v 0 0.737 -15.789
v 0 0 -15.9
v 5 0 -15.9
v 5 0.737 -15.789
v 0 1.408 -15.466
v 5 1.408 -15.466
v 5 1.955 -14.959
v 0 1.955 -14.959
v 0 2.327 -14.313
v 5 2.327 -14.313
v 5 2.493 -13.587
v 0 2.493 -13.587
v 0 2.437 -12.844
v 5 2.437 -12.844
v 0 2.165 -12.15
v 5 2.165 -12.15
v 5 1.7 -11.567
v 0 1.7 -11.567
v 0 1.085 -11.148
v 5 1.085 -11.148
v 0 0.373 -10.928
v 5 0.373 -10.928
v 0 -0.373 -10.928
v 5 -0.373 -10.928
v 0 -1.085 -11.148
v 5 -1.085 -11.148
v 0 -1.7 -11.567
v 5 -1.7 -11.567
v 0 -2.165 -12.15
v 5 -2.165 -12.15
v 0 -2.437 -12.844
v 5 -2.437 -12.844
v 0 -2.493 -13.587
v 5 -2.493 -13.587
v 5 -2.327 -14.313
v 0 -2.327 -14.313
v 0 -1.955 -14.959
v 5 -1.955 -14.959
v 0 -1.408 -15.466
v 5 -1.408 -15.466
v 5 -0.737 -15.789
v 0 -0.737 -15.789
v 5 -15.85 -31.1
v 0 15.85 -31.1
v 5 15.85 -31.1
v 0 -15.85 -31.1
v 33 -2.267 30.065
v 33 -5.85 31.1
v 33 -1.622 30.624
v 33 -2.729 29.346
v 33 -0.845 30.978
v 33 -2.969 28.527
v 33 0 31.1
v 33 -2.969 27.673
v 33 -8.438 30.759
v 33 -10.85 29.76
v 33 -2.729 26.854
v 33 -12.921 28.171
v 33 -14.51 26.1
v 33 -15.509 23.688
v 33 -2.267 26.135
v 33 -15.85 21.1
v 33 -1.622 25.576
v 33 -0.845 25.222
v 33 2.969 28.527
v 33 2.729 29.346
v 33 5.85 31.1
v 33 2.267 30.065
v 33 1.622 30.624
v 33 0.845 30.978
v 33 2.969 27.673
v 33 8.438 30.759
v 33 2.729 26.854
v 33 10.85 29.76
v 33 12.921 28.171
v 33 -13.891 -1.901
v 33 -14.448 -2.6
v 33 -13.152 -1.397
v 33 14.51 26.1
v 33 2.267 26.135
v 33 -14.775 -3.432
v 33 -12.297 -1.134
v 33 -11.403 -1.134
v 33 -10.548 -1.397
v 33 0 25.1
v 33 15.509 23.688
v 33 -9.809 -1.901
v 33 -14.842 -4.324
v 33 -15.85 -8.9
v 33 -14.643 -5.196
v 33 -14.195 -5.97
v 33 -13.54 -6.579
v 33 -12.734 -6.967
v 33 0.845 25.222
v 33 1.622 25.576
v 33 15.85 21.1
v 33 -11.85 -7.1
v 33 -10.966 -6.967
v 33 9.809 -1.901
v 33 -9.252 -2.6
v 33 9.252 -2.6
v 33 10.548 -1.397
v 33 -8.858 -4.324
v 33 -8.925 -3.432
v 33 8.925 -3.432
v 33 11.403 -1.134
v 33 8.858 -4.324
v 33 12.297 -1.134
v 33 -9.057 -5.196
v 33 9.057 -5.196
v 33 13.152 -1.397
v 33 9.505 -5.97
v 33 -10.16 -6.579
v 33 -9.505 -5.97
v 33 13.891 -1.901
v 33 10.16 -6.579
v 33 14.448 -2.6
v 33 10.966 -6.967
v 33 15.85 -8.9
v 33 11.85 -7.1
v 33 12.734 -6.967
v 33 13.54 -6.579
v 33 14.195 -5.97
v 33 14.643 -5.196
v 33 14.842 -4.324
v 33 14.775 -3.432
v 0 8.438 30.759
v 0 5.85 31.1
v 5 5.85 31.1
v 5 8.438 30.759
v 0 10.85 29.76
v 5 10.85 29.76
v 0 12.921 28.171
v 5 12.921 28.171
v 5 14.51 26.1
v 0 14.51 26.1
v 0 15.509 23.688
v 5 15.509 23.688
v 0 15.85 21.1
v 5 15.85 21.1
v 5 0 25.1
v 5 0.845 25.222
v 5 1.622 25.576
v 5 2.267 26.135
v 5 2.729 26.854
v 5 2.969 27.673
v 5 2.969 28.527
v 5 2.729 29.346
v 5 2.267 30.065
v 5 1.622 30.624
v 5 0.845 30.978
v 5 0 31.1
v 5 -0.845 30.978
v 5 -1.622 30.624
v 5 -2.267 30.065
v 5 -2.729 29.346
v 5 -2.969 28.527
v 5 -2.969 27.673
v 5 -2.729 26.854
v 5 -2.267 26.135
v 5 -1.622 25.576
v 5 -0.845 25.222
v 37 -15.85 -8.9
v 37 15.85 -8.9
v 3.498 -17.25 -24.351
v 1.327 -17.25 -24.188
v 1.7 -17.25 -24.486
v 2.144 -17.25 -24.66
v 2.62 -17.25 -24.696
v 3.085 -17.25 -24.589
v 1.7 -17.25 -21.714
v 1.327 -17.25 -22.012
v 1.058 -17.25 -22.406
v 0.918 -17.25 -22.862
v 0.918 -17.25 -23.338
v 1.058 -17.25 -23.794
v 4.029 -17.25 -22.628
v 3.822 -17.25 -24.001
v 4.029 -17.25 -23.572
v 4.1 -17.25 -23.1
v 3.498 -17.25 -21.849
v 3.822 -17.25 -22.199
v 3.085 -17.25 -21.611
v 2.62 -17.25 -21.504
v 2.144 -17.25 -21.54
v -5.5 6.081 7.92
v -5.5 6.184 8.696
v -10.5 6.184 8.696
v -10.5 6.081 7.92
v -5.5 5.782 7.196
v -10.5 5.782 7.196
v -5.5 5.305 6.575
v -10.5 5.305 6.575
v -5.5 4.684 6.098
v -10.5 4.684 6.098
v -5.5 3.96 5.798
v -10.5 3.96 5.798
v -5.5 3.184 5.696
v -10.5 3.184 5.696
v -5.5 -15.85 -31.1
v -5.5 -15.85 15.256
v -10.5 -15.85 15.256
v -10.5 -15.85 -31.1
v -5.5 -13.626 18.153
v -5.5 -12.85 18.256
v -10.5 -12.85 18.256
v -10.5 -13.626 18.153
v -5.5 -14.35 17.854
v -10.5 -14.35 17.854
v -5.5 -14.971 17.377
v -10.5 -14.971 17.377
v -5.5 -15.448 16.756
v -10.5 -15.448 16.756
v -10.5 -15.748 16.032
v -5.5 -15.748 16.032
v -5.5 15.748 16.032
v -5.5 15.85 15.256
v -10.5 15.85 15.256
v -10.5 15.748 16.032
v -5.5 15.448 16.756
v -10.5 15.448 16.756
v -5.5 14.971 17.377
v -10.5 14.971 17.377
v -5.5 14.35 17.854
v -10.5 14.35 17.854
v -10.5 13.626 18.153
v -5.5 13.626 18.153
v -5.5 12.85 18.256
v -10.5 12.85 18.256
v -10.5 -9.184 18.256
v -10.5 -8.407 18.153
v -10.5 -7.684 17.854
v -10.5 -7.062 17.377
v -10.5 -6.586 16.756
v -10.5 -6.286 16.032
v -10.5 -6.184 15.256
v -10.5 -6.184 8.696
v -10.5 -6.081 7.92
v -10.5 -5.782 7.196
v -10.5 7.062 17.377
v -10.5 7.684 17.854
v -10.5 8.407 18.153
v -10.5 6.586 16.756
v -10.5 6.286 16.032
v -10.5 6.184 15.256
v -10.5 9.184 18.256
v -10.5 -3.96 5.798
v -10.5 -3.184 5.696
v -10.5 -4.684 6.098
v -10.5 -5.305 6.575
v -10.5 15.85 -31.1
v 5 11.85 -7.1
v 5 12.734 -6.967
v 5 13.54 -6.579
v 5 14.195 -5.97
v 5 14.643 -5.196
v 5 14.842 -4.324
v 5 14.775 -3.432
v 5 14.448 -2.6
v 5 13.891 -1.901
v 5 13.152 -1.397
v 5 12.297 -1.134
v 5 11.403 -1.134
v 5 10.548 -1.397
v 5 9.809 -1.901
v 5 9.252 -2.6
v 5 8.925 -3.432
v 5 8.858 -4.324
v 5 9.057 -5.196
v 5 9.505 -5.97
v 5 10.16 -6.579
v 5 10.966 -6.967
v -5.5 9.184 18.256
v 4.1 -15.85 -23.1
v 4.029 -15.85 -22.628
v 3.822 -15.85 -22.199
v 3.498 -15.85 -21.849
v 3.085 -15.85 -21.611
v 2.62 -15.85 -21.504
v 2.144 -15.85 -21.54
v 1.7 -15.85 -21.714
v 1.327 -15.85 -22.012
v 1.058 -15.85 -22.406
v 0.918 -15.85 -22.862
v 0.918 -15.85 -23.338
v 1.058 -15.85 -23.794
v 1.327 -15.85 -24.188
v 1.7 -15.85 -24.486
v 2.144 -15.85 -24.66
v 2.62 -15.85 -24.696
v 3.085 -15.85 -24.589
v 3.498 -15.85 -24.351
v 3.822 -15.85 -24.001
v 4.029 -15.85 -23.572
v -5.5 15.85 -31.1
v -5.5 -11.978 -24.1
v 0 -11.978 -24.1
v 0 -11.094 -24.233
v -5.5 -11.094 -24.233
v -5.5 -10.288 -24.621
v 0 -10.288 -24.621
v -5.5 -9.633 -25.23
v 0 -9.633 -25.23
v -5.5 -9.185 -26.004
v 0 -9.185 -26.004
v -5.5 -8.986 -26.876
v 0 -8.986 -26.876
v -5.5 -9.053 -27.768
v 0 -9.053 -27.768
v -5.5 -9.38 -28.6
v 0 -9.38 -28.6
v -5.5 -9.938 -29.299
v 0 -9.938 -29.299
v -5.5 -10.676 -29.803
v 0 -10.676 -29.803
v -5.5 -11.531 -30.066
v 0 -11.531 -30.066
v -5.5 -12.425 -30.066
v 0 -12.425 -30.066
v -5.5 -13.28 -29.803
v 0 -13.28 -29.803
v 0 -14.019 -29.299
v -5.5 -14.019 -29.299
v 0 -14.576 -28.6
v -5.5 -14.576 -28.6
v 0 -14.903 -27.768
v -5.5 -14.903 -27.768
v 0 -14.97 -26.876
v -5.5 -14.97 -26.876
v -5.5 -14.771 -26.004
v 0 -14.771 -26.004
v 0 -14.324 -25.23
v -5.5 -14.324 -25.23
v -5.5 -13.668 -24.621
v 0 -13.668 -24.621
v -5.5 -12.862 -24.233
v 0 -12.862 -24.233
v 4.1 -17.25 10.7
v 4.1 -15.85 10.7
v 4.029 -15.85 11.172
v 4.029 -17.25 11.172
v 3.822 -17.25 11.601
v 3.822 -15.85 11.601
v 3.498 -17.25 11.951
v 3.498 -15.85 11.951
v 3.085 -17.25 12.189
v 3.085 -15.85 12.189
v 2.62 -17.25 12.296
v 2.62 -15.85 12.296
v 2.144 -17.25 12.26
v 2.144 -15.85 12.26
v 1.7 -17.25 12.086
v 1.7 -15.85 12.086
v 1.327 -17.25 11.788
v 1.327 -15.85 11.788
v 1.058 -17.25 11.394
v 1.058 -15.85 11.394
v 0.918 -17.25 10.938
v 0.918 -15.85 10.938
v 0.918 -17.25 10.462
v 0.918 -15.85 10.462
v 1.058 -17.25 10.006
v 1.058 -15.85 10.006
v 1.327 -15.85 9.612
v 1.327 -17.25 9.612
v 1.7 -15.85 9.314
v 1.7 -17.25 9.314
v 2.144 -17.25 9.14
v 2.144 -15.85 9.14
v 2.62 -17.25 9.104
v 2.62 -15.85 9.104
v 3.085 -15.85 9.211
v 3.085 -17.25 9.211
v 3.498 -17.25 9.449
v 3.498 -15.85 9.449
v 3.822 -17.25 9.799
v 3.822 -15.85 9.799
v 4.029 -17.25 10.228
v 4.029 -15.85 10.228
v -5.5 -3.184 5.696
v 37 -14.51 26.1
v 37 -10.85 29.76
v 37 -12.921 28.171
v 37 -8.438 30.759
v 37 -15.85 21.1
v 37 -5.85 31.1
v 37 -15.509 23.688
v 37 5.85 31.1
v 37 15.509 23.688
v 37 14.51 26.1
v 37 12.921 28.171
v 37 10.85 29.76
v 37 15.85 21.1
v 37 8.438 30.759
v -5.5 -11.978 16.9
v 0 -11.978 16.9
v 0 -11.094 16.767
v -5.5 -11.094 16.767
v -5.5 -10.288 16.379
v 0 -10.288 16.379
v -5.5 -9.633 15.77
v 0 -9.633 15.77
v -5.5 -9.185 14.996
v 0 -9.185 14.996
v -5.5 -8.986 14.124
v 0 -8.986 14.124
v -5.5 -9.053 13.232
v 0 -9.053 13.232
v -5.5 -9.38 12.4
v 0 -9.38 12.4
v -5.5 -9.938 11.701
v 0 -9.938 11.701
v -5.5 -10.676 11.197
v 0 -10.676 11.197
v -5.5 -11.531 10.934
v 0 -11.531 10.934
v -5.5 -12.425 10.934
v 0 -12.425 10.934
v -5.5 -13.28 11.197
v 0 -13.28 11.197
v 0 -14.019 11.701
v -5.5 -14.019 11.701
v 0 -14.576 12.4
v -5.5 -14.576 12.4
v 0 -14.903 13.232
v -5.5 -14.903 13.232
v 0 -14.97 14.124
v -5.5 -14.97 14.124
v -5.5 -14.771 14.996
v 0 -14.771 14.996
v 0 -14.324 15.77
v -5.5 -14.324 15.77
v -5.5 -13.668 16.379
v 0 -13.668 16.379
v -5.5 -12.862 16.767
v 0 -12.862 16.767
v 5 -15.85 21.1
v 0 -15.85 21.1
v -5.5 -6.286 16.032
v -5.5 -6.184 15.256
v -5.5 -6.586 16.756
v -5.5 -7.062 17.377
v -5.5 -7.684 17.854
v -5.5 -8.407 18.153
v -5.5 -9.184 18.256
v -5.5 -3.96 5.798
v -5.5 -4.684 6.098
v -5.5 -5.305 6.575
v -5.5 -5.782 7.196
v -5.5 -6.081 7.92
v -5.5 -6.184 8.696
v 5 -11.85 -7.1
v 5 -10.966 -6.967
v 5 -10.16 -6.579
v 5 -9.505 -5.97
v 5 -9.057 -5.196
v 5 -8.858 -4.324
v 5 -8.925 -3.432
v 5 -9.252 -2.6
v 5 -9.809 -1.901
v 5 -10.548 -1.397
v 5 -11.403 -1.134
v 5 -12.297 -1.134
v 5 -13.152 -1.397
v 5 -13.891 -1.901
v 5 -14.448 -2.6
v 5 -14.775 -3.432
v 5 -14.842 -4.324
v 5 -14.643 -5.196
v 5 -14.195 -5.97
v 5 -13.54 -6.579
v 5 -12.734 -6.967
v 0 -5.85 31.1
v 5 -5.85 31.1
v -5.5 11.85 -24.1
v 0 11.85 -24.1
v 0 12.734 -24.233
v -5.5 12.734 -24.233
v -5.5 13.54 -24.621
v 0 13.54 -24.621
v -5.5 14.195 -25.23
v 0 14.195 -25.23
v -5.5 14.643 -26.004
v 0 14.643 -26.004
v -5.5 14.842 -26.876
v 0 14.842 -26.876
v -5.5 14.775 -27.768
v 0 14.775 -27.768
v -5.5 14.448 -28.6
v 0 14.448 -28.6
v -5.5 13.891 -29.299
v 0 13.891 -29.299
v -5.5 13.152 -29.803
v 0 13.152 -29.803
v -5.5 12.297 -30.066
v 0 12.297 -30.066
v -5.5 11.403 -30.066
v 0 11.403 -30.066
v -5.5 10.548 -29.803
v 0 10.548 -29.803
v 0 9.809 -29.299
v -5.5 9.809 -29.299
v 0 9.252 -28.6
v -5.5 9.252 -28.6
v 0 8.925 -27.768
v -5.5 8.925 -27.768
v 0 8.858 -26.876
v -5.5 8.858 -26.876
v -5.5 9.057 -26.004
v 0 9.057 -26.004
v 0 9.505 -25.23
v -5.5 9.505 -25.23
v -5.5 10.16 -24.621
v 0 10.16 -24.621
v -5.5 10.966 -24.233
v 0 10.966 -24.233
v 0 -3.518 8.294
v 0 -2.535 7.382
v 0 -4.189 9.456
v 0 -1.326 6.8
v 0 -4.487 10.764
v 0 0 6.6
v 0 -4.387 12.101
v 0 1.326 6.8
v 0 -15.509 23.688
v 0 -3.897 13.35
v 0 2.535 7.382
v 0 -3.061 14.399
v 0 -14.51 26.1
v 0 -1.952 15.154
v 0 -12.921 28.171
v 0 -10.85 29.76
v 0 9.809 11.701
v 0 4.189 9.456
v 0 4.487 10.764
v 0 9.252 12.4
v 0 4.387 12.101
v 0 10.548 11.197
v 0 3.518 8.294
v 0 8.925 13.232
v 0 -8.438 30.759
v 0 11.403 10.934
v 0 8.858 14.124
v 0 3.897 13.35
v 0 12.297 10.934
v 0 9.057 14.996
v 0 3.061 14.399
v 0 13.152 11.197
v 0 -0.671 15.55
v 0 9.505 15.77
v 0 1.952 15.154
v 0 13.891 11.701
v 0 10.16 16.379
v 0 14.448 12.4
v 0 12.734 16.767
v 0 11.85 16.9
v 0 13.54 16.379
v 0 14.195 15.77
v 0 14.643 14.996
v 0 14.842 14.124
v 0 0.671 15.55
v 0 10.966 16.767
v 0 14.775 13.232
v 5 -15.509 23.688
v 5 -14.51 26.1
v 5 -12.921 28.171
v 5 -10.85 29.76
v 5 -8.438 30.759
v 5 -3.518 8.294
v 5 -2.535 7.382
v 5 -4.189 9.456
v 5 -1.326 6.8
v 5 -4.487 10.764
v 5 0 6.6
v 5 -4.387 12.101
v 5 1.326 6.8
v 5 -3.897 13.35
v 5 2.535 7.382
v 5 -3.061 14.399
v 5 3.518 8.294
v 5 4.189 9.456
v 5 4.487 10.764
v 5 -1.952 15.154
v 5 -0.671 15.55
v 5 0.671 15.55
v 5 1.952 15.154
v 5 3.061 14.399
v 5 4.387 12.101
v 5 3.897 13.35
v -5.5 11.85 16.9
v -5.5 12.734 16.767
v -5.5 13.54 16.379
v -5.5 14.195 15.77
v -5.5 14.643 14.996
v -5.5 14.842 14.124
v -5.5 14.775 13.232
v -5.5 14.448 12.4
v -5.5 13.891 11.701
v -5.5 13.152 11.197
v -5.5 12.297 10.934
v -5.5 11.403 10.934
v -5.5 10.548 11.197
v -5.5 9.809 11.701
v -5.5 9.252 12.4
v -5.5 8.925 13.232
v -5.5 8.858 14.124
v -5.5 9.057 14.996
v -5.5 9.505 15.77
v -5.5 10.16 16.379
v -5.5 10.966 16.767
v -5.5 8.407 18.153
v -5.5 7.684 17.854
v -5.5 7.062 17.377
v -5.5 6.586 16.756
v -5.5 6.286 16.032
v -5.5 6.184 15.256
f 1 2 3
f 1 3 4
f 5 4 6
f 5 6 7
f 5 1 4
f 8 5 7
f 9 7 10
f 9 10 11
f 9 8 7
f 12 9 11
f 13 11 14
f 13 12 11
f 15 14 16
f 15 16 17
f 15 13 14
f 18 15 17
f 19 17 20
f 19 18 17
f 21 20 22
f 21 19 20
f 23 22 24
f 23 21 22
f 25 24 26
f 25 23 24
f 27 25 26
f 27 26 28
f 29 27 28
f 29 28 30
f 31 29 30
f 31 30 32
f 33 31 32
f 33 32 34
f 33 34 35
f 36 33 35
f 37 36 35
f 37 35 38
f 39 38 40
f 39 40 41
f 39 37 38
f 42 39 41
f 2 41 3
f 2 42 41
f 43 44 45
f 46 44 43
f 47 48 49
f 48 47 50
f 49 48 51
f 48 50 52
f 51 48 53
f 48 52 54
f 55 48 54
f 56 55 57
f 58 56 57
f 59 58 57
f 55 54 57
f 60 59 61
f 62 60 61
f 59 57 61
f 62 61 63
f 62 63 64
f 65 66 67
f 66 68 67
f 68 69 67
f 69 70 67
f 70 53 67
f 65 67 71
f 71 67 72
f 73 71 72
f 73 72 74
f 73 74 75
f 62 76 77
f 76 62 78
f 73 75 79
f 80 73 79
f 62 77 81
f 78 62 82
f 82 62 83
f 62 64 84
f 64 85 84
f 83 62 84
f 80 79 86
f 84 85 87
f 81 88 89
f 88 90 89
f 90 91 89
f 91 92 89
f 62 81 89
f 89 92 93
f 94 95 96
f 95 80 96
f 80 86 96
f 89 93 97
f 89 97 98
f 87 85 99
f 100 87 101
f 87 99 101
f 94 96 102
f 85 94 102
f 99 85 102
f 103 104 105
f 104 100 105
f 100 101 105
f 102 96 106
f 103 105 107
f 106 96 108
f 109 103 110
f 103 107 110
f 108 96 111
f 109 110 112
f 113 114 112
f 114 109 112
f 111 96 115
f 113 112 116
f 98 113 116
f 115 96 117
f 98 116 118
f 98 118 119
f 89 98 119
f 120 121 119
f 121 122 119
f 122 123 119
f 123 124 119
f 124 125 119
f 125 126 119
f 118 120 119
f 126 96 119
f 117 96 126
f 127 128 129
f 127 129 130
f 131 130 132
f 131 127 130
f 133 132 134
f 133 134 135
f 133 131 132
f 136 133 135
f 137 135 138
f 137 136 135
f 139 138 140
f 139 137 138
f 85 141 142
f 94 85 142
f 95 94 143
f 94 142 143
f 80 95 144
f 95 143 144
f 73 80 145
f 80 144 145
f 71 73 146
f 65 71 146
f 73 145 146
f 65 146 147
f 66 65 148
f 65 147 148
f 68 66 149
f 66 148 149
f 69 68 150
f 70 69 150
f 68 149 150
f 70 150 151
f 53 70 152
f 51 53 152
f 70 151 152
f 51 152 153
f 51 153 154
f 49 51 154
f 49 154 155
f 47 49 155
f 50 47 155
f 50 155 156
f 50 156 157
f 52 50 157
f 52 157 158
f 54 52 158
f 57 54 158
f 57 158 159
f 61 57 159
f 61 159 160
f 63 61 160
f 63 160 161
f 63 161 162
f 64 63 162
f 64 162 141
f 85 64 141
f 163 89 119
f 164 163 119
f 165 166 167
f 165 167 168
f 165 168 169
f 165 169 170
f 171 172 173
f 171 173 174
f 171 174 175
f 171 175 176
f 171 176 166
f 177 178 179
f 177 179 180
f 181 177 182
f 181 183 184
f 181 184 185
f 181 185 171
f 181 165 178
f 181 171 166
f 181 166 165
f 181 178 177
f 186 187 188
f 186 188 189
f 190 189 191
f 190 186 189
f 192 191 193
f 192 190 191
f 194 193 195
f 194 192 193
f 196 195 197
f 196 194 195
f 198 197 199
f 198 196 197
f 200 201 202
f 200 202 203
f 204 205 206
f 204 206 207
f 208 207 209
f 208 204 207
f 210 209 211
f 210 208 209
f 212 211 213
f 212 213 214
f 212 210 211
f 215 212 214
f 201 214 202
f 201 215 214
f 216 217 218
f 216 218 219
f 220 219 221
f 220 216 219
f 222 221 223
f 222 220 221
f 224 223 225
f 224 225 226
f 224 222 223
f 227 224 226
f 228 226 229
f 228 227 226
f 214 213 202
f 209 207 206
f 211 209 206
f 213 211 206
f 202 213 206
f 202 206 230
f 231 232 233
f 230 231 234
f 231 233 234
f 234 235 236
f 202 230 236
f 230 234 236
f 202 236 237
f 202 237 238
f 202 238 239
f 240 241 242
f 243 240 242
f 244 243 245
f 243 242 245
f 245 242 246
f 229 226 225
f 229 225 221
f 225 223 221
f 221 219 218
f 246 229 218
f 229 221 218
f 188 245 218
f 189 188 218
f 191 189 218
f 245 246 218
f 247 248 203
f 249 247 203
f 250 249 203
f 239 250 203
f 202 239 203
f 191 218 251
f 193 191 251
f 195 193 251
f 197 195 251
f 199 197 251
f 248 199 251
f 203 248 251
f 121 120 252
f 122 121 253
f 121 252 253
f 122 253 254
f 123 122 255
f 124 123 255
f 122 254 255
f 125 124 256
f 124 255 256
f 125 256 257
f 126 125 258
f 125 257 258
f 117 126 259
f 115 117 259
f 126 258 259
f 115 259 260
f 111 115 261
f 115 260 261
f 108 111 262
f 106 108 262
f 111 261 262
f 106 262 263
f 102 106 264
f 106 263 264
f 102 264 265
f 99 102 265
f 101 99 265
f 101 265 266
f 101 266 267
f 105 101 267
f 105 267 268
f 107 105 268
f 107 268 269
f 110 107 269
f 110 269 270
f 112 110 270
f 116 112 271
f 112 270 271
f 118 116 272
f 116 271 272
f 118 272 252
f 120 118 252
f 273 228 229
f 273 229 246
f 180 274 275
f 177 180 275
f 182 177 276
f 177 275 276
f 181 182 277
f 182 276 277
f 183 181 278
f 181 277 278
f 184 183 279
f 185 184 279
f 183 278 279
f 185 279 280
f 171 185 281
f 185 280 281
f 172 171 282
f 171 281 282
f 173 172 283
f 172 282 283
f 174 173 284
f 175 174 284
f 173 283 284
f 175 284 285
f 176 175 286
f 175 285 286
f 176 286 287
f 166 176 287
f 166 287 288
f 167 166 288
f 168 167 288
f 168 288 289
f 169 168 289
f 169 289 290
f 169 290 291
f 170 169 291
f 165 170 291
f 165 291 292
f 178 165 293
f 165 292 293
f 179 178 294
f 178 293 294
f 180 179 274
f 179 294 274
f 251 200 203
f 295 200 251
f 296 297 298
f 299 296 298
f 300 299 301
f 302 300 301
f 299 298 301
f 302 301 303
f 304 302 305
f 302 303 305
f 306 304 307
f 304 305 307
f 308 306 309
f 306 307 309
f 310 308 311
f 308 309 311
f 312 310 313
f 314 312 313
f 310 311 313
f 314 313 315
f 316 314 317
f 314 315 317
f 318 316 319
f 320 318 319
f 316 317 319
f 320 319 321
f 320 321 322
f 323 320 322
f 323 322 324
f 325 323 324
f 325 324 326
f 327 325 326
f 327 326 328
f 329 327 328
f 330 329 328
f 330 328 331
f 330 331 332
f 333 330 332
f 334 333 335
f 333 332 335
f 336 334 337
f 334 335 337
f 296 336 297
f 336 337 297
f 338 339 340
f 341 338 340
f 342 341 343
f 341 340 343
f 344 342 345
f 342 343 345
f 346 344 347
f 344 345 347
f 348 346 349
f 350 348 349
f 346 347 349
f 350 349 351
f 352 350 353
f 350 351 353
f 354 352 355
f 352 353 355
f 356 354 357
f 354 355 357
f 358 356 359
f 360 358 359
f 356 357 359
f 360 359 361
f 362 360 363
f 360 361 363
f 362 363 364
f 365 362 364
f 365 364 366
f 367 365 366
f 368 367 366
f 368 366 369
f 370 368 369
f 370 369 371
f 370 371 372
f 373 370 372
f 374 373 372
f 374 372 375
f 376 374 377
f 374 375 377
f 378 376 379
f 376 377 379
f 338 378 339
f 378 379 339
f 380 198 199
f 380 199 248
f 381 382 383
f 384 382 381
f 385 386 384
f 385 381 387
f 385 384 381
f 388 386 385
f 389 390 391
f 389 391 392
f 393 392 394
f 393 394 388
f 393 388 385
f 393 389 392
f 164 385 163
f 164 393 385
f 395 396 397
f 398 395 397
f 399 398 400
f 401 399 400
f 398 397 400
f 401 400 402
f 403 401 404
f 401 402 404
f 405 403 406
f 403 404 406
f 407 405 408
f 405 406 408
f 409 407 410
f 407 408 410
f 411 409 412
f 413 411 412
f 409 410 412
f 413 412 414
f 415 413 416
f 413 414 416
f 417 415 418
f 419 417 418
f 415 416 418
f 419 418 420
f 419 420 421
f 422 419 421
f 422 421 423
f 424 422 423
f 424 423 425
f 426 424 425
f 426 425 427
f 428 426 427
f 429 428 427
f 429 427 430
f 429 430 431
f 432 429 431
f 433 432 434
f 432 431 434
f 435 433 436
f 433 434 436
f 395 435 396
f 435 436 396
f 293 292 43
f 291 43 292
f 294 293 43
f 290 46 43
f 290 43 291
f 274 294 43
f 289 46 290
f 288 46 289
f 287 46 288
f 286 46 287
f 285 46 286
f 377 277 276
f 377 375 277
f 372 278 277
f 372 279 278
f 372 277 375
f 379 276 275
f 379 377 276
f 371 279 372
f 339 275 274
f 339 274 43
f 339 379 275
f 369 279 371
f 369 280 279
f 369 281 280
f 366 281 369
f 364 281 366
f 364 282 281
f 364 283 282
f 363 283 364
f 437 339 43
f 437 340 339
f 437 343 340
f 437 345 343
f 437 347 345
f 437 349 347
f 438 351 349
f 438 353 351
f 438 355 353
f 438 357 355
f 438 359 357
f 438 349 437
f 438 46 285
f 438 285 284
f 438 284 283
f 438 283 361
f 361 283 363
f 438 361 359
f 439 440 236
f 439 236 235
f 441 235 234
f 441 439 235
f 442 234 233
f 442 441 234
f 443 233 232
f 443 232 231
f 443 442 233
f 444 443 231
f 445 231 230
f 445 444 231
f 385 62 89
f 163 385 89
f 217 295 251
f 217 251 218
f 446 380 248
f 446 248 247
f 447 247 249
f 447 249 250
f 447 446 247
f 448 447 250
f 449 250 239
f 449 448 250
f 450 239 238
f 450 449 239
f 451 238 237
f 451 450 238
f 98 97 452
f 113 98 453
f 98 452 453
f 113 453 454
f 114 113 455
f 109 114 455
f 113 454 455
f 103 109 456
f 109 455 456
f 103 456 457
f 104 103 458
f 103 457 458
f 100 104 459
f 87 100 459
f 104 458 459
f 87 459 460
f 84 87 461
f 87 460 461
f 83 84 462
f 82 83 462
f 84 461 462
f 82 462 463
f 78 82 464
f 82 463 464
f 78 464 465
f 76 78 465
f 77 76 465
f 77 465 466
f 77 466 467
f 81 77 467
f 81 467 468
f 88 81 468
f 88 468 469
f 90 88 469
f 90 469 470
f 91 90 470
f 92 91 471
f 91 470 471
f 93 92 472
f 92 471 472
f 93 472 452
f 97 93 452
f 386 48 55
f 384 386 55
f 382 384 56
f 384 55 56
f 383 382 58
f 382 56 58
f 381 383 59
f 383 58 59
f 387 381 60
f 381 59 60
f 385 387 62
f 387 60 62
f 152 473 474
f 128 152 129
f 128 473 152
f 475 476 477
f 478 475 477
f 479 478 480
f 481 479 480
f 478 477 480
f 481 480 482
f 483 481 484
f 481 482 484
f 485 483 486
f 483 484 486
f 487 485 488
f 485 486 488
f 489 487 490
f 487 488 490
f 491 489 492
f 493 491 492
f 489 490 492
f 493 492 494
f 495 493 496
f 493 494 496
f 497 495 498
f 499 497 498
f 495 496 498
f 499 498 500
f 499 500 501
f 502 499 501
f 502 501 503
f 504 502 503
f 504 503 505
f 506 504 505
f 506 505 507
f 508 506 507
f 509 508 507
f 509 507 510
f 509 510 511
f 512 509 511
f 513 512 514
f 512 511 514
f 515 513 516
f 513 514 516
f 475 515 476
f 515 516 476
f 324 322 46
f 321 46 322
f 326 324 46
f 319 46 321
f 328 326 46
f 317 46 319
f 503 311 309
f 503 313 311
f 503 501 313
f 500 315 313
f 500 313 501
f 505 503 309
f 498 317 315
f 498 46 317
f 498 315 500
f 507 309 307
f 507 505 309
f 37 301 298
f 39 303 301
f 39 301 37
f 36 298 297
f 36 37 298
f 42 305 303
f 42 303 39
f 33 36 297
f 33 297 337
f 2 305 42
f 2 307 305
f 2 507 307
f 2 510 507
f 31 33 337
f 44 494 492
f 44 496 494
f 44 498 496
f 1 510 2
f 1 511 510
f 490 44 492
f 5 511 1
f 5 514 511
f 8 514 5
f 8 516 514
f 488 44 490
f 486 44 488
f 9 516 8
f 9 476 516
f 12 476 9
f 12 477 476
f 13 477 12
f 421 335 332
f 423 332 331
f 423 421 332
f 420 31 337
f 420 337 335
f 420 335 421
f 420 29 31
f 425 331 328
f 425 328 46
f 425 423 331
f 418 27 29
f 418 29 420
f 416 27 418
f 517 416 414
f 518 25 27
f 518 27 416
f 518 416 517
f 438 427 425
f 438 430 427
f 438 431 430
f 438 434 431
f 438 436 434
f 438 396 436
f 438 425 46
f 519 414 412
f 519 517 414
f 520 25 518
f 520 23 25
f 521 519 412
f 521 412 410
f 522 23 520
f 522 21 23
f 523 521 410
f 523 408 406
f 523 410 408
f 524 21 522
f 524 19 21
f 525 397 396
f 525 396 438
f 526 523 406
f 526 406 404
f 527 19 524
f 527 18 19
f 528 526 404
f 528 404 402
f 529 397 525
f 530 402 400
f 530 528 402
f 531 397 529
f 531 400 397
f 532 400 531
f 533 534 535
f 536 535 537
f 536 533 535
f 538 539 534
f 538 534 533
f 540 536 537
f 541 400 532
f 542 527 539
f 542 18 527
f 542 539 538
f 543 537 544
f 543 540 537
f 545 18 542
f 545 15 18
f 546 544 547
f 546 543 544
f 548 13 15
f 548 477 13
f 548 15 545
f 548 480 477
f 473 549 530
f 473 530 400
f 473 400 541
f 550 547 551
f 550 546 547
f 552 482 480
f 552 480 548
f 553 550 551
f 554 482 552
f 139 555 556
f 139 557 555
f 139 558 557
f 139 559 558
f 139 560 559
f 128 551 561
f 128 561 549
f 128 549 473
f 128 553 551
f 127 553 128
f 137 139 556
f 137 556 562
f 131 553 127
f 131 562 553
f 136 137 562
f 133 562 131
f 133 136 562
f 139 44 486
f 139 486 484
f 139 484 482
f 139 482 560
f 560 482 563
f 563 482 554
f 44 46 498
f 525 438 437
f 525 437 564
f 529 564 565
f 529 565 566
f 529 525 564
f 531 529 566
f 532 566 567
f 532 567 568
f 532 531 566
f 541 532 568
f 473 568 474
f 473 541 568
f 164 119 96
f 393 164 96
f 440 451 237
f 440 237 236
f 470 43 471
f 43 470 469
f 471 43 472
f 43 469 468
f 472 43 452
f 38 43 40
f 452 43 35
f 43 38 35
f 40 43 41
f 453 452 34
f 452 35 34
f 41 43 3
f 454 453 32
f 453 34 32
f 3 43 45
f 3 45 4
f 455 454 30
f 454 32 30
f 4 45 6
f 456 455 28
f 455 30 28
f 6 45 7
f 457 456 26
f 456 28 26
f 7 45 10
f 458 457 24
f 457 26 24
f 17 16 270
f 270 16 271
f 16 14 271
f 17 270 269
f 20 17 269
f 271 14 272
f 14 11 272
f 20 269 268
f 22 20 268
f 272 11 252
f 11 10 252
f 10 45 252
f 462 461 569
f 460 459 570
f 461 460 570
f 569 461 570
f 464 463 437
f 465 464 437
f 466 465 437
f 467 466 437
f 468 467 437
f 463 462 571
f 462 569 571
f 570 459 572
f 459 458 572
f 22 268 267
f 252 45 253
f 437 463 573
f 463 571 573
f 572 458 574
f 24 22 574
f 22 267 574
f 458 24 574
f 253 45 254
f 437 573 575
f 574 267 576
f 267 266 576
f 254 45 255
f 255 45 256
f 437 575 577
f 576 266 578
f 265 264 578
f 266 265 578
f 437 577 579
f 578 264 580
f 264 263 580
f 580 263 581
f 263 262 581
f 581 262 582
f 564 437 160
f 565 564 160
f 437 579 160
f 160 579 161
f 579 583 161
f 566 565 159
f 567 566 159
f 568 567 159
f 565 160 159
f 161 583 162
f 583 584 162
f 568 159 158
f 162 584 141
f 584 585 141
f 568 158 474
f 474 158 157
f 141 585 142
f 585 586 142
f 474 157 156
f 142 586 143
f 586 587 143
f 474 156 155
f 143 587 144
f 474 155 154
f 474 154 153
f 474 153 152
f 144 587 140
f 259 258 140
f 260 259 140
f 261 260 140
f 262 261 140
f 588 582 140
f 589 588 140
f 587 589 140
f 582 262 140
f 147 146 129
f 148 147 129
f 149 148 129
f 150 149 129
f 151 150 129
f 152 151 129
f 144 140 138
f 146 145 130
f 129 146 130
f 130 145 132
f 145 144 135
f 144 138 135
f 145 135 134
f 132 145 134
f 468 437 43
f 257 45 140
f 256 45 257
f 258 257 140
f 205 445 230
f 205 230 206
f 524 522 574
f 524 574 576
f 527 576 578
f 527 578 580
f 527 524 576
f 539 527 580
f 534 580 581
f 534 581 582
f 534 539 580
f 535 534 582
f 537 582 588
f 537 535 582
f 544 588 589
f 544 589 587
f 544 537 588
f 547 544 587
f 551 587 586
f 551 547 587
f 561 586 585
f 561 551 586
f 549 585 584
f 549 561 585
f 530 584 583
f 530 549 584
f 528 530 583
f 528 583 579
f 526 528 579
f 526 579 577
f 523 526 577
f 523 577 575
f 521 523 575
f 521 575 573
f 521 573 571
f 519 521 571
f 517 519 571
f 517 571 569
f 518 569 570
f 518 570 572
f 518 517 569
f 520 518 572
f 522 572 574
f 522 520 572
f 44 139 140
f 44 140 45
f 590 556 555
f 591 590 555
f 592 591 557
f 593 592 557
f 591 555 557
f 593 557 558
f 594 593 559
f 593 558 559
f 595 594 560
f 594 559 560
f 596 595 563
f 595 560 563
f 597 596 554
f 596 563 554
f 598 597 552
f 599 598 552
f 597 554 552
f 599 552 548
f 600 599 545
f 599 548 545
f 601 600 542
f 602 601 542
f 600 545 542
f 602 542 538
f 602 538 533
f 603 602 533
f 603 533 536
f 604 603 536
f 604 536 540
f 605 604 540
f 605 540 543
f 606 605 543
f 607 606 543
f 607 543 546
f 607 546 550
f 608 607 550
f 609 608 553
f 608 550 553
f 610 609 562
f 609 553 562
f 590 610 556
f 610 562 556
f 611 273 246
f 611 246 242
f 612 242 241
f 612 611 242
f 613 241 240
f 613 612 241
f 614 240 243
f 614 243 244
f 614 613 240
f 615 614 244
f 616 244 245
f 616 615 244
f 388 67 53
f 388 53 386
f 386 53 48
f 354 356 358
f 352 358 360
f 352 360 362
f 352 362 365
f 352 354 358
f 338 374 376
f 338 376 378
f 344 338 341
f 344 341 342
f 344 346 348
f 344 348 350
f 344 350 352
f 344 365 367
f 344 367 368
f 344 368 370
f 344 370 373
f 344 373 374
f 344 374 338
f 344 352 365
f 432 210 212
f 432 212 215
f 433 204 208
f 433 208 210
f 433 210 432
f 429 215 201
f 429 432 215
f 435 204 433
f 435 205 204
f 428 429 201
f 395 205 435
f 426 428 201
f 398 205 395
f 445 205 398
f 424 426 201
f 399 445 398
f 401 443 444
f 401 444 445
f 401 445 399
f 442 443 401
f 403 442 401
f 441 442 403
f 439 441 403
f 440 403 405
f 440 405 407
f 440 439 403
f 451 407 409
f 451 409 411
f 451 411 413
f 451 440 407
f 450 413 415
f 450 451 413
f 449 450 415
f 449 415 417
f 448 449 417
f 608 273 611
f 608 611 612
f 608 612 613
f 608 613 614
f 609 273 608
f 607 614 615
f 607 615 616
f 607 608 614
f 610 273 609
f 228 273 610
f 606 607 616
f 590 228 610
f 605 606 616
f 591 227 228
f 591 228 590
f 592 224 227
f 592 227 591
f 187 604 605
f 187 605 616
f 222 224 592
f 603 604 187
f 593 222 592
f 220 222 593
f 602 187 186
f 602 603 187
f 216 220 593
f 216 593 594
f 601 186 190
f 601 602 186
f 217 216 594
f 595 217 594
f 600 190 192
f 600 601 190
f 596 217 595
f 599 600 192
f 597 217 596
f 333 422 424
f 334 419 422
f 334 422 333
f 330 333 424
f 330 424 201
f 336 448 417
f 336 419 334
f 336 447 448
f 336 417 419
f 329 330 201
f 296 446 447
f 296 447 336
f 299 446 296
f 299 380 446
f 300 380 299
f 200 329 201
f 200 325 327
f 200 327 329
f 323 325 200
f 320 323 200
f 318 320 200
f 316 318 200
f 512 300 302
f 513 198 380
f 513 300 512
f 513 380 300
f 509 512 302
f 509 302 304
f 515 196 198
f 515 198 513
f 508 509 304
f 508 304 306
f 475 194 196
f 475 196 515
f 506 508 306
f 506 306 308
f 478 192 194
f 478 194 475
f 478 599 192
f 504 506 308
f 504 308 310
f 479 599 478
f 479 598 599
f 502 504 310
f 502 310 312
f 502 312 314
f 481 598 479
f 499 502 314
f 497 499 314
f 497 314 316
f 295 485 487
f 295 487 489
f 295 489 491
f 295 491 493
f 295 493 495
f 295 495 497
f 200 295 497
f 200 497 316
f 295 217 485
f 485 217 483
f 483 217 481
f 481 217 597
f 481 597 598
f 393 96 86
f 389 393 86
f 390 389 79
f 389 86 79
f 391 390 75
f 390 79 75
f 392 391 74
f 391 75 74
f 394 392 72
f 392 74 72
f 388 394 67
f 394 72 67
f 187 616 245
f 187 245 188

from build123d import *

# Parameters (mm, degrees)
SKETCH_1_R      = 4.5
SKETCH_1_R_2    = 2.5
EXTRUDE_1_DEPTH = 5
SKETCH_2_R      = 3
EXTRUDE_2_DEPTH = 28
EXTRUDE_3_DEPTH = 4
SKETCH_5_R      = 3
EXTRUDE_4_DEPTH = 5.5
EXTRUDE_6_DEPTH = 5
SKETCH_7_R      = 1.6
EXTRUDE_7_DEPTH = 1.4


with BuildPart() as part:
    # 草图1 → 凸台-拉伸1 (new body)
    with BuildSketch(Plane(origin=(0, 0, 0), x_dir=(0, 0, -1), z_dir=(1, 0, 0))):
        with BuildLine():
            Line((31.1, -15.85), (-21.1, -15.85))
            ThreePointArc((-21.1, -15.85), (-28.171067812, -12.921067812), (-31.1, -5.85))
            Line((-31.1, -5.85), (-31.1, 5.85))
            ThreePointArc((-31.1, 5.85), (-28.171067812, 12.921067812), (-21.1, 15.85))
            Line((-21.1, 15.85), (31.1, 15.85))
            Line((31.1, 15.85), (31.1, -15.85))
        make_face()
        with Locations((-11.1, 0)):
            Circle(SKETCH_1_R, mode=Mode.SUBTRACT)
        with Locations((13.4, 0)):
            Circle(SKETCH_1_R_2, mode=Mode.SUBTRACT)
    extrude(amount=EXTRUDE_1_DEPTH)

    # 草图2 → 凸台-拉伸2 (add)
    with BuildSketch(Plane(origin=(5, 0, 0), x_dir=(0, 0, -1), z_dir=(1, 0, 0))):
        with Locations((-28.1, 0)):
            Circle(SKETCH_2_R)
        with Locations((4.1, 11.85)):
            Circle(SKETCH_2_R)
        with Locations((4.1, -11.85)):
            Circle(SKETCH_2_R)
    extrude(amount=EXTRUDE_2_DEPTH)

    # 草图3 → 凸台-拉伸3 (add)
    with BuildSketch(Plane(origin=(33, 0, 0), x_dir=(0, 0, -1), z_dir=(1, 0, 0))):
        with BuildLine():
            Line((8.9, 15.85), (-21.1, 15.85))
            ThreePointArc((-21.1, 15.85), (-28.171067812, 12.921067812), (-31.1, 5.85))
            Line((-31.1, 5.85), (-31.1, 0))
            Line((-31.1, 0), (-31.1, -5.85))
            ThreePointArc((-31.1, -5.85), (-28.171067812, -12.921067812), (-21.1, -15.85))
            Line((-21.1, -15.85), (8.9, -15.85))
            Line((8.9, -15.85), (8.9, 15.85))
        make_face()
    extrude(amount=EXTRUDE_3_DEPTH)

    # 草图5 → 凸台-拉伸4 (add)
    with BuildSketch(Plane.ZY):
        with Locations((-27.1, 11.85)):
            Circle(SKETCH_5_R)
        with Locations((-27.1, -11.978090594)):
            Circle(SKETCH_5_R)
        with Locations((13.9, 11.85)):
            Circle(SKETCH_5_R)
        with Locations((13.9, -11.978090594)):
            Circle(SKETCH_5_R)
    extrude(amount=EXTRUDE_4_DEPTH)

    # 草图6 → 凸台-拉伸6 (add)
    with BuildSketch(Plane.ZY.offset(5.5)):
        with BuildLine():
            Line((15.255672946, -15.85), (-31.1, -15.85))
            Line((-31.1, -15.85), (-31.1, 15.85))
            Line((-31.1, 15.85), (15.255672946, 15.85))
            ThreePointArc((15.255672946, 15.85), (17.376993289, 14.971320344), (18.255672946, 12.85))
            Line((18.255672946, 12.85), (18.255672946, 9.183659284))
            ThreePointArc((18.255672946, 9.183659284), (17.376993289, 7.062338941), (15.255672946, 6.183659284))
            Line((15.255672946, 6.183659284), (8.696116264, 6.183659284))
            ThreePointArc((8.696116264, 6.183659284), (6.574795921, 5.304979628), (5.696116264, 3.183659284))
            Line((5.696116264, 3.183659284), (5.696116264, -3.183659284))
            ThreePointArc((5.696116264, -3.183659284), (6.574795921, -5.304979628), (8.696116264, -6.183659284))
            Line((8.696116264, -6.183659284), (15.255672946, -6.183659284))
            ThreePointArc((15.255672946, -6.183659284), (17.376993289, -7.062338941), (18.255672946, -9.183659284))
            Line((18.255672946, -9.183659284), (18.255672946, -12.85))
            ThreePointArc((18.255672946, -12.85), (17.376993289, -14.971320344), (15.255672946, -15.85))
        make_face()
    extrude(amount=EXTRUDE_6_DEPTH)

    # 草图7 → 凸台-拉伸7 (add)
    with BuildSketch(Plane.XZ.offset(15.85)):
        with Locations((2.5, 10.7)):
            Circle(SKETCH_7_R)
        with Locations((2.5, -23.1)):
            Circle(SKETCH_7_R)
    extrude(amount=EXTRUDE_7_DEPTH)


solid = part.part
